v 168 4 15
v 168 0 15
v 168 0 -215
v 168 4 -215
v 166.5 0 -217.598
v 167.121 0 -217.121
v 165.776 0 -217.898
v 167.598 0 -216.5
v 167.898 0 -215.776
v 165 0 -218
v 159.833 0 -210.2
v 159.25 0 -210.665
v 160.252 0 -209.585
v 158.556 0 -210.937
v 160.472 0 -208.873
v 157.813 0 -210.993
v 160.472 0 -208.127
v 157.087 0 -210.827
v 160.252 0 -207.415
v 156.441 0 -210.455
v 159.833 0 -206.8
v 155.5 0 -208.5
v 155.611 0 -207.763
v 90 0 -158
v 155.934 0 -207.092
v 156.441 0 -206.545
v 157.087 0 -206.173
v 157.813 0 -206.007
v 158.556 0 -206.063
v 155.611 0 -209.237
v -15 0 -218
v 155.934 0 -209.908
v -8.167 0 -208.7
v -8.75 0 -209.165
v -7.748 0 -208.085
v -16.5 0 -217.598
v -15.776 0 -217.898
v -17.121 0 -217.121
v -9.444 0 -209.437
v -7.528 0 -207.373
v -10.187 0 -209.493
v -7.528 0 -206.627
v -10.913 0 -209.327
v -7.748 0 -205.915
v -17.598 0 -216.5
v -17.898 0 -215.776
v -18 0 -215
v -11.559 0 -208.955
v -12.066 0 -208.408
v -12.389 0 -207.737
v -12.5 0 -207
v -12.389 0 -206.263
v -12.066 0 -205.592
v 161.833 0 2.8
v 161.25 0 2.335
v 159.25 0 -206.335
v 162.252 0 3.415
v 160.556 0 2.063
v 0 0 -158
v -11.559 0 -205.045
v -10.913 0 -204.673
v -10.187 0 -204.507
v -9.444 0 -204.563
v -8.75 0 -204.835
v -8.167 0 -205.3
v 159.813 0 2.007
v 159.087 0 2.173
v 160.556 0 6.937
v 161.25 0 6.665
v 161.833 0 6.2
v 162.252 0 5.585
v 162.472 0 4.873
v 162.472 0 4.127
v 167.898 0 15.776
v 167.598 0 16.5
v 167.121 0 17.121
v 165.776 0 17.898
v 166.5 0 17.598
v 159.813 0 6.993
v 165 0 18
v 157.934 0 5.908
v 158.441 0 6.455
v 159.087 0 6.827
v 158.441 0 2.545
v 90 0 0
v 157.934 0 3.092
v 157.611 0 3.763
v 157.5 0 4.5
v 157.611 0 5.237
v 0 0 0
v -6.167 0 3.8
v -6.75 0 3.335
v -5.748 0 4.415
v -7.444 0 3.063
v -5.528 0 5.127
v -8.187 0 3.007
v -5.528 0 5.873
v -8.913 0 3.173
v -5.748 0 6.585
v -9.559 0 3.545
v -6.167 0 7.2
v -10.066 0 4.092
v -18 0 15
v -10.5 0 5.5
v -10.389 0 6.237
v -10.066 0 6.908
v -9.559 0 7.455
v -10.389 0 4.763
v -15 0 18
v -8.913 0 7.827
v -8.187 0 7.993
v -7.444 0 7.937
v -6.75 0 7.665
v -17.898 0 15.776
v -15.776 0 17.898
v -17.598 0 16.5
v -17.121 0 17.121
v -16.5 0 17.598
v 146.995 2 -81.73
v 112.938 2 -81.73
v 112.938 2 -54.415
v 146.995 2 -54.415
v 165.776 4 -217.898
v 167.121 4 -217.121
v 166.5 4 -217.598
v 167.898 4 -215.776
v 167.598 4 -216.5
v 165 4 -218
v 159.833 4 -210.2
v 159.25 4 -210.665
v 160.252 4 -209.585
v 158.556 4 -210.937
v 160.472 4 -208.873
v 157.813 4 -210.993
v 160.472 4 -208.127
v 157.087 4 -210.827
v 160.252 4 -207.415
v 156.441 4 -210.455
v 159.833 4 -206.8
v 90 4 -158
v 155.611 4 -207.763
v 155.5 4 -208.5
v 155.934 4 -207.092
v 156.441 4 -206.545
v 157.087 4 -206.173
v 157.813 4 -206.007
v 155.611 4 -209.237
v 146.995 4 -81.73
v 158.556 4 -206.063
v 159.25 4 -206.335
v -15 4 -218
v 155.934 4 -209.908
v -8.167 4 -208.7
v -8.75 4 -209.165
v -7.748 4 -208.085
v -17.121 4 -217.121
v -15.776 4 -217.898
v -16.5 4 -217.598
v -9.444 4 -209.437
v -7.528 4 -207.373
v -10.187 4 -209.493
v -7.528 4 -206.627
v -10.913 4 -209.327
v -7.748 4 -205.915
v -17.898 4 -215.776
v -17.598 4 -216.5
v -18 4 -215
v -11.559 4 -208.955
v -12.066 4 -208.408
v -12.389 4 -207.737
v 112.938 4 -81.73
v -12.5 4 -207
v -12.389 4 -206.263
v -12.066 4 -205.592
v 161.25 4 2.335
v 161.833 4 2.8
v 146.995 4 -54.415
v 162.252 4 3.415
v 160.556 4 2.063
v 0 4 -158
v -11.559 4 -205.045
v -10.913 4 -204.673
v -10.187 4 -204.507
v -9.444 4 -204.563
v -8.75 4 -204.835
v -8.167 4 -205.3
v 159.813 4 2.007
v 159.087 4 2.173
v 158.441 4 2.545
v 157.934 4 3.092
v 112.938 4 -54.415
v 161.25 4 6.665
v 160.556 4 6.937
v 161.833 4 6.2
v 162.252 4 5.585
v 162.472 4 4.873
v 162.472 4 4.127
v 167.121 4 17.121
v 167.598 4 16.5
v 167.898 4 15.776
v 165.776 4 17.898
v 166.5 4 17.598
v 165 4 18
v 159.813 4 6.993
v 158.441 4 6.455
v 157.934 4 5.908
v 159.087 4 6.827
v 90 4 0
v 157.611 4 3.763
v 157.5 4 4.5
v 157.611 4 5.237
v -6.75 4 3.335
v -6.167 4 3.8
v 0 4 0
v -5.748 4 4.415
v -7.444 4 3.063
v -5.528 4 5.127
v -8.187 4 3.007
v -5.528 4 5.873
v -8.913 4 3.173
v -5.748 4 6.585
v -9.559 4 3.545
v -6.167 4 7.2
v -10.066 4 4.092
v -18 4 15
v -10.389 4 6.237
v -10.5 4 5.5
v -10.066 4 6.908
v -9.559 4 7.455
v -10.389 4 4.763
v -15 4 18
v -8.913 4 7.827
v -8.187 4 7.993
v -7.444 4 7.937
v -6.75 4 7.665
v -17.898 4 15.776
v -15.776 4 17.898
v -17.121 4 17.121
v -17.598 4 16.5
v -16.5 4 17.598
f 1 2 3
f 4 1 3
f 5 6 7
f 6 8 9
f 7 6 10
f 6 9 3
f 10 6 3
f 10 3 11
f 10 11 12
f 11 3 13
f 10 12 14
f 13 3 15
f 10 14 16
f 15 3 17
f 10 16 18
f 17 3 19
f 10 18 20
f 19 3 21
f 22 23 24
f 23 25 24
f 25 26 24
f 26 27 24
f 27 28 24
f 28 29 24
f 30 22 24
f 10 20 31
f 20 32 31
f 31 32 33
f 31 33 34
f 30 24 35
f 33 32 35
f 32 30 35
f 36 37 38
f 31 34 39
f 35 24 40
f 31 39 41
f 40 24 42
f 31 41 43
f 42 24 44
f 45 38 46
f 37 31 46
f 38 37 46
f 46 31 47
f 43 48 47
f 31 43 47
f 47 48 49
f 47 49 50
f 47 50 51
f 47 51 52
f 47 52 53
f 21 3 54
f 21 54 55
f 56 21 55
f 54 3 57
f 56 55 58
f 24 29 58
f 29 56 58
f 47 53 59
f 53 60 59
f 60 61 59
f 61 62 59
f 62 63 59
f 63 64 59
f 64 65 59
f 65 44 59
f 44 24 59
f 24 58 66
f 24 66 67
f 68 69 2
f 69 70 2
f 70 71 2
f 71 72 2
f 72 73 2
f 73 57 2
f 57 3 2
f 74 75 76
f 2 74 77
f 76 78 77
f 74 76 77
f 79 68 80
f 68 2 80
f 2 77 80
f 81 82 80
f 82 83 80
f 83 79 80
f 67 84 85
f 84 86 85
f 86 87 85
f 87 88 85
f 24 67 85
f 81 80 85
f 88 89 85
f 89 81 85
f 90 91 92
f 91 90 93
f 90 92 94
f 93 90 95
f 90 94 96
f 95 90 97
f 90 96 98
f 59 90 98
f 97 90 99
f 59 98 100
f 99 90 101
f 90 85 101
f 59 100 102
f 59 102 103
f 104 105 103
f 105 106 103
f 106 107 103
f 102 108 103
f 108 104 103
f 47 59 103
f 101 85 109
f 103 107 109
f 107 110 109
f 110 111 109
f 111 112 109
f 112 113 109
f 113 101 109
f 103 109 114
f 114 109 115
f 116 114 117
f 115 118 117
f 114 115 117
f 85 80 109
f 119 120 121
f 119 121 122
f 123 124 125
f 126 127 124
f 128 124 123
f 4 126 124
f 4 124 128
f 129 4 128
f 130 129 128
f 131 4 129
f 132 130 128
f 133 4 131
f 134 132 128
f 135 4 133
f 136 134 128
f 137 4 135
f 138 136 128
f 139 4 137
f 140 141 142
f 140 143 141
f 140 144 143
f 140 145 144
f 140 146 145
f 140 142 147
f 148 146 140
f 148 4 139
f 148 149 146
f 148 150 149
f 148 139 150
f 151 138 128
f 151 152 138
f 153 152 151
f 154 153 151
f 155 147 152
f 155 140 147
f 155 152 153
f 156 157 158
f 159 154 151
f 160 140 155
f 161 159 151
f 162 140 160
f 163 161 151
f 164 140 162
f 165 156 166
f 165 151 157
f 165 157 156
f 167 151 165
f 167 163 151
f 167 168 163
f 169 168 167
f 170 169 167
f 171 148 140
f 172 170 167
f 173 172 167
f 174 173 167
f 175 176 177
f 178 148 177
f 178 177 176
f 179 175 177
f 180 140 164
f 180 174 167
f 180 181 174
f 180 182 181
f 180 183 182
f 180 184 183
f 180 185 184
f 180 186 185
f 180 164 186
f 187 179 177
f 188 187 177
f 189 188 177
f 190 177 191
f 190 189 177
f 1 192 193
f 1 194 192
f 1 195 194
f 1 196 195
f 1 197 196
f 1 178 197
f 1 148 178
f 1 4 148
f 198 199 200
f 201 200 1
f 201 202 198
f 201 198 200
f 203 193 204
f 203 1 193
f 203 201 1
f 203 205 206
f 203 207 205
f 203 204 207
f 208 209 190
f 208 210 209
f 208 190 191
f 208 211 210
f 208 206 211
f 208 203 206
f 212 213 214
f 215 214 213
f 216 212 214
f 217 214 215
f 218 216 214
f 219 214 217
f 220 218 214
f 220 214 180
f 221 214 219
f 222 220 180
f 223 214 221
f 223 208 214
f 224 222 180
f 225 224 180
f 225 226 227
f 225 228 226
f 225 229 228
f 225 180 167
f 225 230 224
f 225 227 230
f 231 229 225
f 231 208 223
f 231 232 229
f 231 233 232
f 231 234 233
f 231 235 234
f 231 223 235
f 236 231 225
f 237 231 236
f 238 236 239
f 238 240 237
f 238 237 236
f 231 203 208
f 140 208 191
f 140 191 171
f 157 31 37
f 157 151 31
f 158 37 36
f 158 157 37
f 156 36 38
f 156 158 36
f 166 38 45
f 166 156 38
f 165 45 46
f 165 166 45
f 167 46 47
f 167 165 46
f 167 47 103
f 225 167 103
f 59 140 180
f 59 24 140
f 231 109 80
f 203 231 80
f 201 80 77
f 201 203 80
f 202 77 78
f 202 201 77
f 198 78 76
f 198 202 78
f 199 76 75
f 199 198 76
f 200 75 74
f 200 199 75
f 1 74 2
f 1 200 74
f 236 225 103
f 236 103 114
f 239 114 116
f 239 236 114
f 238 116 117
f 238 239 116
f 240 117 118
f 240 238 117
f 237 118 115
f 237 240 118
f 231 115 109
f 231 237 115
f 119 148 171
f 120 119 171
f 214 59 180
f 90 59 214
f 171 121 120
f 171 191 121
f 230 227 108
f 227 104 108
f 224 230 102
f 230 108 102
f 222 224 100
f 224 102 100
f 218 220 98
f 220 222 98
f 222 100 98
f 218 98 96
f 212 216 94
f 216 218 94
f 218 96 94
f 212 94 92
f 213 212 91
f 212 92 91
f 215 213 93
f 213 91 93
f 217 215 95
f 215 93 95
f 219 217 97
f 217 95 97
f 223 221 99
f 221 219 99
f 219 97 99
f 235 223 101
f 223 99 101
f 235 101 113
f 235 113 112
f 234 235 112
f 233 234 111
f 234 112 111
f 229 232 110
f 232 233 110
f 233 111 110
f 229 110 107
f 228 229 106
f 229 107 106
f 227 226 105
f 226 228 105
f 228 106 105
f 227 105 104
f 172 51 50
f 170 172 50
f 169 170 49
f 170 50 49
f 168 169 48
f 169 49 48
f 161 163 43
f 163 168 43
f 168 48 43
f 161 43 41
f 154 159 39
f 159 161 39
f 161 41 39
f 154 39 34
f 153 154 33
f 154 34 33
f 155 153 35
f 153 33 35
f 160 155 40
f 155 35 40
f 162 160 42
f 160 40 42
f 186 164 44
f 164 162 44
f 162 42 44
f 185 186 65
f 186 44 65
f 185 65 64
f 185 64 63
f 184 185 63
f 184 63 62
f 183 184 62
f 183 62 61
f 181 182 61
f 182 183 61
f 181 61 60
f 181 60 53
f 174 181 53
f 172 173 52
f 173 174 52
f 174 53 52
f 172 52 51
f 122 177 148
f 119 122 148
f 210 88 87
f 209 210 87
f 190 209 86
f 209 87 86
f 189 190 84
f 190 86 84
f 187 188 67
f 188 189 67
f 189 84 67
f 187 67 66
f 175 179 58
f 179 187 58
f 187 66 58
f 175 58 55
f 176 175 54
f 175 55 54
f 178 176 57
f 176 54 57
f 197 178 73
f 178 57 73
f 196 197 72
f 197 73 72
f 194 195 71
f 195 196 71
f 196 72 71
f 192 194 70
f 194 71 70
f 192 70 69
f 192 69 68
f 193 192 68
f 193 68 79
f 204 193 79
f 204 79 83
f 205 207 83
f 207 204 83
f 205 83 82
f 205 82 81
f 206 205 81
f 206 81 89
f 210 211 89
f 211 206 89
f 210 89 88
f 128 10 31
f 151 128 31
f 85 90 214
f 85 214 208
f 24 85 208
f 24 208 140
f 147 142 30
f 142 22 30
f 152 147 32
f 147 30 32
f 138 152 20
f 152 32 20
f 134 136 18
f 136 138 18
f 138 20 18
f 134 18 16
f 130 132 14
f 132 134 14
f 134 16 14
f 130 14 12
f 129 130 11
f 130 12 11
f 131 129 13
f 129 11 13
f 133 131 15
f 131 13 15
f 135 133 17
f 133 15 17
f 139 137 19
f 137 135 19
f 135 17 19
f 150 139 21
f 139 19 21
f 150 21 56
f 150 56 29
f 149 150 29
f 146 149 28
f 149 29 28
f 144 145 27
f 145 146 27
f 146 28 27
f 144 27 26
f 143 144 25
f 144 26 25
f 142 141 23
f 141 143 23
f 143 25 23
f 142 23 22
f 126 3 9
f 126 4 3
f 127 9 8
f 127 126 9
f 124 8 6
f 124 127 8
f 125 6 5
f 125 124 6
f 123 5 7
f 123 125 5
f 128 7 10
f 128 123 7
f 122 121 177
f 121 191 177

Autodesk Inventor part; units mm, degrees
ref_plane "YZ Plane" through (0, 0, 0) normal (1, 0, 0) x (0, 1, 0)
ref_plane "XZ Plane" through (0, 0, 0) normal (0, 1, 0) x (-1, 0, 0)
sketch "Skizze1" plane through (0, 0, 0) normal (0, 1, 0) x (-1, 0, 0)
  line L0 (0, 0) -> (-90, 0)
  line L1 (-90, 0) -> (-90, -158)
  line L2 (-90, -158) -> (0, -158)
  line L3 (0, -158) -> (0, 0)
  line L4 (18, 18) -> (-168, 18)
  line L5 (-168, 18) -> (-168, -218)
  line L6 (-168, -218) -> (18, -218)
  line L7 (18, -218) -> (18, 18)
  circle A0 centre (8, 5.5) radius 2.5
  circle A1 centre (10, -207) radius 2.5
  circle A2 centre (-158, -208.5) radius 2.5
  circle A3 centre (-160, 4.5) radius 2.5
  dimension "d0" = 90
  dimension "d1" = 158
  dimension "d2" = 78
  dimension "d3" = 18
  dimension "d4" = 18
  dimension "d5" = 60
  dimension "r" = 5
  dimension "d7" = 5
  dimension "d8" = 5
  dimension "d9" = 5
  dimension "d10" = 8
  dimension "d11" = 5.5
  dimension "d12" = 4.5
  dimension "d13" = 70
  dimension "d14" = 68
  dimension "d15" = 50.5
  dimension "d16" = 49
  dimension "d17" = 10
extrude "Extrusion1" add sketch "Skizze1" along normal blind 4
fillet "Rundung1" radius 3 4 edges at (-18, 2, -218) (-18, 2, 18) (168, 2, 18) (168, 2, -218)
ref_plane "Arbeitsebene1" through (0, 8, 0) normal (0, 1, 0) x (1, 0, 0)
sketch "Skizze3" plane through (0, 4, 0) normal (0, 1, 0) x (1, 0, 0)
  line L0 (112.9385, 54.4149) -> (112.9385, 81.7299)
  line L1 (112.9385, 81.7299) -> (146.9954, 81.7299) construction
  line L2 (146.9954, 81.7299) -> (146.9954, 54.4149) construction
  line L3 (146.9954, 54.4149) -> (112.9385, 54.4149) construction
  line L4 (112.9385, 54.4149) -> (146.9954, 54.4149)
  line L5 (146.9954, 54.4149) -> (146.9954, 81.7299)
  line L6 (146.9954, 81.7299) -> (112.9385, 81.7299)
  line L7 (112.9385, 81.7299) -> (112.9385, 54.4149)
  point P0 (0, 0)
extrude "Extrusion3" cut sketch "Skizze3" against normal blind 2
equation "\"d7\" = r"
equation "\"d8\" = r"
equation "\"d9\" = r"
equation "\"d50\" = a"
equation "\"d51\" = a"
equation "\"d52\" = a"
equation "\"a\" = 2.6"
properties part number "frontpanel"
